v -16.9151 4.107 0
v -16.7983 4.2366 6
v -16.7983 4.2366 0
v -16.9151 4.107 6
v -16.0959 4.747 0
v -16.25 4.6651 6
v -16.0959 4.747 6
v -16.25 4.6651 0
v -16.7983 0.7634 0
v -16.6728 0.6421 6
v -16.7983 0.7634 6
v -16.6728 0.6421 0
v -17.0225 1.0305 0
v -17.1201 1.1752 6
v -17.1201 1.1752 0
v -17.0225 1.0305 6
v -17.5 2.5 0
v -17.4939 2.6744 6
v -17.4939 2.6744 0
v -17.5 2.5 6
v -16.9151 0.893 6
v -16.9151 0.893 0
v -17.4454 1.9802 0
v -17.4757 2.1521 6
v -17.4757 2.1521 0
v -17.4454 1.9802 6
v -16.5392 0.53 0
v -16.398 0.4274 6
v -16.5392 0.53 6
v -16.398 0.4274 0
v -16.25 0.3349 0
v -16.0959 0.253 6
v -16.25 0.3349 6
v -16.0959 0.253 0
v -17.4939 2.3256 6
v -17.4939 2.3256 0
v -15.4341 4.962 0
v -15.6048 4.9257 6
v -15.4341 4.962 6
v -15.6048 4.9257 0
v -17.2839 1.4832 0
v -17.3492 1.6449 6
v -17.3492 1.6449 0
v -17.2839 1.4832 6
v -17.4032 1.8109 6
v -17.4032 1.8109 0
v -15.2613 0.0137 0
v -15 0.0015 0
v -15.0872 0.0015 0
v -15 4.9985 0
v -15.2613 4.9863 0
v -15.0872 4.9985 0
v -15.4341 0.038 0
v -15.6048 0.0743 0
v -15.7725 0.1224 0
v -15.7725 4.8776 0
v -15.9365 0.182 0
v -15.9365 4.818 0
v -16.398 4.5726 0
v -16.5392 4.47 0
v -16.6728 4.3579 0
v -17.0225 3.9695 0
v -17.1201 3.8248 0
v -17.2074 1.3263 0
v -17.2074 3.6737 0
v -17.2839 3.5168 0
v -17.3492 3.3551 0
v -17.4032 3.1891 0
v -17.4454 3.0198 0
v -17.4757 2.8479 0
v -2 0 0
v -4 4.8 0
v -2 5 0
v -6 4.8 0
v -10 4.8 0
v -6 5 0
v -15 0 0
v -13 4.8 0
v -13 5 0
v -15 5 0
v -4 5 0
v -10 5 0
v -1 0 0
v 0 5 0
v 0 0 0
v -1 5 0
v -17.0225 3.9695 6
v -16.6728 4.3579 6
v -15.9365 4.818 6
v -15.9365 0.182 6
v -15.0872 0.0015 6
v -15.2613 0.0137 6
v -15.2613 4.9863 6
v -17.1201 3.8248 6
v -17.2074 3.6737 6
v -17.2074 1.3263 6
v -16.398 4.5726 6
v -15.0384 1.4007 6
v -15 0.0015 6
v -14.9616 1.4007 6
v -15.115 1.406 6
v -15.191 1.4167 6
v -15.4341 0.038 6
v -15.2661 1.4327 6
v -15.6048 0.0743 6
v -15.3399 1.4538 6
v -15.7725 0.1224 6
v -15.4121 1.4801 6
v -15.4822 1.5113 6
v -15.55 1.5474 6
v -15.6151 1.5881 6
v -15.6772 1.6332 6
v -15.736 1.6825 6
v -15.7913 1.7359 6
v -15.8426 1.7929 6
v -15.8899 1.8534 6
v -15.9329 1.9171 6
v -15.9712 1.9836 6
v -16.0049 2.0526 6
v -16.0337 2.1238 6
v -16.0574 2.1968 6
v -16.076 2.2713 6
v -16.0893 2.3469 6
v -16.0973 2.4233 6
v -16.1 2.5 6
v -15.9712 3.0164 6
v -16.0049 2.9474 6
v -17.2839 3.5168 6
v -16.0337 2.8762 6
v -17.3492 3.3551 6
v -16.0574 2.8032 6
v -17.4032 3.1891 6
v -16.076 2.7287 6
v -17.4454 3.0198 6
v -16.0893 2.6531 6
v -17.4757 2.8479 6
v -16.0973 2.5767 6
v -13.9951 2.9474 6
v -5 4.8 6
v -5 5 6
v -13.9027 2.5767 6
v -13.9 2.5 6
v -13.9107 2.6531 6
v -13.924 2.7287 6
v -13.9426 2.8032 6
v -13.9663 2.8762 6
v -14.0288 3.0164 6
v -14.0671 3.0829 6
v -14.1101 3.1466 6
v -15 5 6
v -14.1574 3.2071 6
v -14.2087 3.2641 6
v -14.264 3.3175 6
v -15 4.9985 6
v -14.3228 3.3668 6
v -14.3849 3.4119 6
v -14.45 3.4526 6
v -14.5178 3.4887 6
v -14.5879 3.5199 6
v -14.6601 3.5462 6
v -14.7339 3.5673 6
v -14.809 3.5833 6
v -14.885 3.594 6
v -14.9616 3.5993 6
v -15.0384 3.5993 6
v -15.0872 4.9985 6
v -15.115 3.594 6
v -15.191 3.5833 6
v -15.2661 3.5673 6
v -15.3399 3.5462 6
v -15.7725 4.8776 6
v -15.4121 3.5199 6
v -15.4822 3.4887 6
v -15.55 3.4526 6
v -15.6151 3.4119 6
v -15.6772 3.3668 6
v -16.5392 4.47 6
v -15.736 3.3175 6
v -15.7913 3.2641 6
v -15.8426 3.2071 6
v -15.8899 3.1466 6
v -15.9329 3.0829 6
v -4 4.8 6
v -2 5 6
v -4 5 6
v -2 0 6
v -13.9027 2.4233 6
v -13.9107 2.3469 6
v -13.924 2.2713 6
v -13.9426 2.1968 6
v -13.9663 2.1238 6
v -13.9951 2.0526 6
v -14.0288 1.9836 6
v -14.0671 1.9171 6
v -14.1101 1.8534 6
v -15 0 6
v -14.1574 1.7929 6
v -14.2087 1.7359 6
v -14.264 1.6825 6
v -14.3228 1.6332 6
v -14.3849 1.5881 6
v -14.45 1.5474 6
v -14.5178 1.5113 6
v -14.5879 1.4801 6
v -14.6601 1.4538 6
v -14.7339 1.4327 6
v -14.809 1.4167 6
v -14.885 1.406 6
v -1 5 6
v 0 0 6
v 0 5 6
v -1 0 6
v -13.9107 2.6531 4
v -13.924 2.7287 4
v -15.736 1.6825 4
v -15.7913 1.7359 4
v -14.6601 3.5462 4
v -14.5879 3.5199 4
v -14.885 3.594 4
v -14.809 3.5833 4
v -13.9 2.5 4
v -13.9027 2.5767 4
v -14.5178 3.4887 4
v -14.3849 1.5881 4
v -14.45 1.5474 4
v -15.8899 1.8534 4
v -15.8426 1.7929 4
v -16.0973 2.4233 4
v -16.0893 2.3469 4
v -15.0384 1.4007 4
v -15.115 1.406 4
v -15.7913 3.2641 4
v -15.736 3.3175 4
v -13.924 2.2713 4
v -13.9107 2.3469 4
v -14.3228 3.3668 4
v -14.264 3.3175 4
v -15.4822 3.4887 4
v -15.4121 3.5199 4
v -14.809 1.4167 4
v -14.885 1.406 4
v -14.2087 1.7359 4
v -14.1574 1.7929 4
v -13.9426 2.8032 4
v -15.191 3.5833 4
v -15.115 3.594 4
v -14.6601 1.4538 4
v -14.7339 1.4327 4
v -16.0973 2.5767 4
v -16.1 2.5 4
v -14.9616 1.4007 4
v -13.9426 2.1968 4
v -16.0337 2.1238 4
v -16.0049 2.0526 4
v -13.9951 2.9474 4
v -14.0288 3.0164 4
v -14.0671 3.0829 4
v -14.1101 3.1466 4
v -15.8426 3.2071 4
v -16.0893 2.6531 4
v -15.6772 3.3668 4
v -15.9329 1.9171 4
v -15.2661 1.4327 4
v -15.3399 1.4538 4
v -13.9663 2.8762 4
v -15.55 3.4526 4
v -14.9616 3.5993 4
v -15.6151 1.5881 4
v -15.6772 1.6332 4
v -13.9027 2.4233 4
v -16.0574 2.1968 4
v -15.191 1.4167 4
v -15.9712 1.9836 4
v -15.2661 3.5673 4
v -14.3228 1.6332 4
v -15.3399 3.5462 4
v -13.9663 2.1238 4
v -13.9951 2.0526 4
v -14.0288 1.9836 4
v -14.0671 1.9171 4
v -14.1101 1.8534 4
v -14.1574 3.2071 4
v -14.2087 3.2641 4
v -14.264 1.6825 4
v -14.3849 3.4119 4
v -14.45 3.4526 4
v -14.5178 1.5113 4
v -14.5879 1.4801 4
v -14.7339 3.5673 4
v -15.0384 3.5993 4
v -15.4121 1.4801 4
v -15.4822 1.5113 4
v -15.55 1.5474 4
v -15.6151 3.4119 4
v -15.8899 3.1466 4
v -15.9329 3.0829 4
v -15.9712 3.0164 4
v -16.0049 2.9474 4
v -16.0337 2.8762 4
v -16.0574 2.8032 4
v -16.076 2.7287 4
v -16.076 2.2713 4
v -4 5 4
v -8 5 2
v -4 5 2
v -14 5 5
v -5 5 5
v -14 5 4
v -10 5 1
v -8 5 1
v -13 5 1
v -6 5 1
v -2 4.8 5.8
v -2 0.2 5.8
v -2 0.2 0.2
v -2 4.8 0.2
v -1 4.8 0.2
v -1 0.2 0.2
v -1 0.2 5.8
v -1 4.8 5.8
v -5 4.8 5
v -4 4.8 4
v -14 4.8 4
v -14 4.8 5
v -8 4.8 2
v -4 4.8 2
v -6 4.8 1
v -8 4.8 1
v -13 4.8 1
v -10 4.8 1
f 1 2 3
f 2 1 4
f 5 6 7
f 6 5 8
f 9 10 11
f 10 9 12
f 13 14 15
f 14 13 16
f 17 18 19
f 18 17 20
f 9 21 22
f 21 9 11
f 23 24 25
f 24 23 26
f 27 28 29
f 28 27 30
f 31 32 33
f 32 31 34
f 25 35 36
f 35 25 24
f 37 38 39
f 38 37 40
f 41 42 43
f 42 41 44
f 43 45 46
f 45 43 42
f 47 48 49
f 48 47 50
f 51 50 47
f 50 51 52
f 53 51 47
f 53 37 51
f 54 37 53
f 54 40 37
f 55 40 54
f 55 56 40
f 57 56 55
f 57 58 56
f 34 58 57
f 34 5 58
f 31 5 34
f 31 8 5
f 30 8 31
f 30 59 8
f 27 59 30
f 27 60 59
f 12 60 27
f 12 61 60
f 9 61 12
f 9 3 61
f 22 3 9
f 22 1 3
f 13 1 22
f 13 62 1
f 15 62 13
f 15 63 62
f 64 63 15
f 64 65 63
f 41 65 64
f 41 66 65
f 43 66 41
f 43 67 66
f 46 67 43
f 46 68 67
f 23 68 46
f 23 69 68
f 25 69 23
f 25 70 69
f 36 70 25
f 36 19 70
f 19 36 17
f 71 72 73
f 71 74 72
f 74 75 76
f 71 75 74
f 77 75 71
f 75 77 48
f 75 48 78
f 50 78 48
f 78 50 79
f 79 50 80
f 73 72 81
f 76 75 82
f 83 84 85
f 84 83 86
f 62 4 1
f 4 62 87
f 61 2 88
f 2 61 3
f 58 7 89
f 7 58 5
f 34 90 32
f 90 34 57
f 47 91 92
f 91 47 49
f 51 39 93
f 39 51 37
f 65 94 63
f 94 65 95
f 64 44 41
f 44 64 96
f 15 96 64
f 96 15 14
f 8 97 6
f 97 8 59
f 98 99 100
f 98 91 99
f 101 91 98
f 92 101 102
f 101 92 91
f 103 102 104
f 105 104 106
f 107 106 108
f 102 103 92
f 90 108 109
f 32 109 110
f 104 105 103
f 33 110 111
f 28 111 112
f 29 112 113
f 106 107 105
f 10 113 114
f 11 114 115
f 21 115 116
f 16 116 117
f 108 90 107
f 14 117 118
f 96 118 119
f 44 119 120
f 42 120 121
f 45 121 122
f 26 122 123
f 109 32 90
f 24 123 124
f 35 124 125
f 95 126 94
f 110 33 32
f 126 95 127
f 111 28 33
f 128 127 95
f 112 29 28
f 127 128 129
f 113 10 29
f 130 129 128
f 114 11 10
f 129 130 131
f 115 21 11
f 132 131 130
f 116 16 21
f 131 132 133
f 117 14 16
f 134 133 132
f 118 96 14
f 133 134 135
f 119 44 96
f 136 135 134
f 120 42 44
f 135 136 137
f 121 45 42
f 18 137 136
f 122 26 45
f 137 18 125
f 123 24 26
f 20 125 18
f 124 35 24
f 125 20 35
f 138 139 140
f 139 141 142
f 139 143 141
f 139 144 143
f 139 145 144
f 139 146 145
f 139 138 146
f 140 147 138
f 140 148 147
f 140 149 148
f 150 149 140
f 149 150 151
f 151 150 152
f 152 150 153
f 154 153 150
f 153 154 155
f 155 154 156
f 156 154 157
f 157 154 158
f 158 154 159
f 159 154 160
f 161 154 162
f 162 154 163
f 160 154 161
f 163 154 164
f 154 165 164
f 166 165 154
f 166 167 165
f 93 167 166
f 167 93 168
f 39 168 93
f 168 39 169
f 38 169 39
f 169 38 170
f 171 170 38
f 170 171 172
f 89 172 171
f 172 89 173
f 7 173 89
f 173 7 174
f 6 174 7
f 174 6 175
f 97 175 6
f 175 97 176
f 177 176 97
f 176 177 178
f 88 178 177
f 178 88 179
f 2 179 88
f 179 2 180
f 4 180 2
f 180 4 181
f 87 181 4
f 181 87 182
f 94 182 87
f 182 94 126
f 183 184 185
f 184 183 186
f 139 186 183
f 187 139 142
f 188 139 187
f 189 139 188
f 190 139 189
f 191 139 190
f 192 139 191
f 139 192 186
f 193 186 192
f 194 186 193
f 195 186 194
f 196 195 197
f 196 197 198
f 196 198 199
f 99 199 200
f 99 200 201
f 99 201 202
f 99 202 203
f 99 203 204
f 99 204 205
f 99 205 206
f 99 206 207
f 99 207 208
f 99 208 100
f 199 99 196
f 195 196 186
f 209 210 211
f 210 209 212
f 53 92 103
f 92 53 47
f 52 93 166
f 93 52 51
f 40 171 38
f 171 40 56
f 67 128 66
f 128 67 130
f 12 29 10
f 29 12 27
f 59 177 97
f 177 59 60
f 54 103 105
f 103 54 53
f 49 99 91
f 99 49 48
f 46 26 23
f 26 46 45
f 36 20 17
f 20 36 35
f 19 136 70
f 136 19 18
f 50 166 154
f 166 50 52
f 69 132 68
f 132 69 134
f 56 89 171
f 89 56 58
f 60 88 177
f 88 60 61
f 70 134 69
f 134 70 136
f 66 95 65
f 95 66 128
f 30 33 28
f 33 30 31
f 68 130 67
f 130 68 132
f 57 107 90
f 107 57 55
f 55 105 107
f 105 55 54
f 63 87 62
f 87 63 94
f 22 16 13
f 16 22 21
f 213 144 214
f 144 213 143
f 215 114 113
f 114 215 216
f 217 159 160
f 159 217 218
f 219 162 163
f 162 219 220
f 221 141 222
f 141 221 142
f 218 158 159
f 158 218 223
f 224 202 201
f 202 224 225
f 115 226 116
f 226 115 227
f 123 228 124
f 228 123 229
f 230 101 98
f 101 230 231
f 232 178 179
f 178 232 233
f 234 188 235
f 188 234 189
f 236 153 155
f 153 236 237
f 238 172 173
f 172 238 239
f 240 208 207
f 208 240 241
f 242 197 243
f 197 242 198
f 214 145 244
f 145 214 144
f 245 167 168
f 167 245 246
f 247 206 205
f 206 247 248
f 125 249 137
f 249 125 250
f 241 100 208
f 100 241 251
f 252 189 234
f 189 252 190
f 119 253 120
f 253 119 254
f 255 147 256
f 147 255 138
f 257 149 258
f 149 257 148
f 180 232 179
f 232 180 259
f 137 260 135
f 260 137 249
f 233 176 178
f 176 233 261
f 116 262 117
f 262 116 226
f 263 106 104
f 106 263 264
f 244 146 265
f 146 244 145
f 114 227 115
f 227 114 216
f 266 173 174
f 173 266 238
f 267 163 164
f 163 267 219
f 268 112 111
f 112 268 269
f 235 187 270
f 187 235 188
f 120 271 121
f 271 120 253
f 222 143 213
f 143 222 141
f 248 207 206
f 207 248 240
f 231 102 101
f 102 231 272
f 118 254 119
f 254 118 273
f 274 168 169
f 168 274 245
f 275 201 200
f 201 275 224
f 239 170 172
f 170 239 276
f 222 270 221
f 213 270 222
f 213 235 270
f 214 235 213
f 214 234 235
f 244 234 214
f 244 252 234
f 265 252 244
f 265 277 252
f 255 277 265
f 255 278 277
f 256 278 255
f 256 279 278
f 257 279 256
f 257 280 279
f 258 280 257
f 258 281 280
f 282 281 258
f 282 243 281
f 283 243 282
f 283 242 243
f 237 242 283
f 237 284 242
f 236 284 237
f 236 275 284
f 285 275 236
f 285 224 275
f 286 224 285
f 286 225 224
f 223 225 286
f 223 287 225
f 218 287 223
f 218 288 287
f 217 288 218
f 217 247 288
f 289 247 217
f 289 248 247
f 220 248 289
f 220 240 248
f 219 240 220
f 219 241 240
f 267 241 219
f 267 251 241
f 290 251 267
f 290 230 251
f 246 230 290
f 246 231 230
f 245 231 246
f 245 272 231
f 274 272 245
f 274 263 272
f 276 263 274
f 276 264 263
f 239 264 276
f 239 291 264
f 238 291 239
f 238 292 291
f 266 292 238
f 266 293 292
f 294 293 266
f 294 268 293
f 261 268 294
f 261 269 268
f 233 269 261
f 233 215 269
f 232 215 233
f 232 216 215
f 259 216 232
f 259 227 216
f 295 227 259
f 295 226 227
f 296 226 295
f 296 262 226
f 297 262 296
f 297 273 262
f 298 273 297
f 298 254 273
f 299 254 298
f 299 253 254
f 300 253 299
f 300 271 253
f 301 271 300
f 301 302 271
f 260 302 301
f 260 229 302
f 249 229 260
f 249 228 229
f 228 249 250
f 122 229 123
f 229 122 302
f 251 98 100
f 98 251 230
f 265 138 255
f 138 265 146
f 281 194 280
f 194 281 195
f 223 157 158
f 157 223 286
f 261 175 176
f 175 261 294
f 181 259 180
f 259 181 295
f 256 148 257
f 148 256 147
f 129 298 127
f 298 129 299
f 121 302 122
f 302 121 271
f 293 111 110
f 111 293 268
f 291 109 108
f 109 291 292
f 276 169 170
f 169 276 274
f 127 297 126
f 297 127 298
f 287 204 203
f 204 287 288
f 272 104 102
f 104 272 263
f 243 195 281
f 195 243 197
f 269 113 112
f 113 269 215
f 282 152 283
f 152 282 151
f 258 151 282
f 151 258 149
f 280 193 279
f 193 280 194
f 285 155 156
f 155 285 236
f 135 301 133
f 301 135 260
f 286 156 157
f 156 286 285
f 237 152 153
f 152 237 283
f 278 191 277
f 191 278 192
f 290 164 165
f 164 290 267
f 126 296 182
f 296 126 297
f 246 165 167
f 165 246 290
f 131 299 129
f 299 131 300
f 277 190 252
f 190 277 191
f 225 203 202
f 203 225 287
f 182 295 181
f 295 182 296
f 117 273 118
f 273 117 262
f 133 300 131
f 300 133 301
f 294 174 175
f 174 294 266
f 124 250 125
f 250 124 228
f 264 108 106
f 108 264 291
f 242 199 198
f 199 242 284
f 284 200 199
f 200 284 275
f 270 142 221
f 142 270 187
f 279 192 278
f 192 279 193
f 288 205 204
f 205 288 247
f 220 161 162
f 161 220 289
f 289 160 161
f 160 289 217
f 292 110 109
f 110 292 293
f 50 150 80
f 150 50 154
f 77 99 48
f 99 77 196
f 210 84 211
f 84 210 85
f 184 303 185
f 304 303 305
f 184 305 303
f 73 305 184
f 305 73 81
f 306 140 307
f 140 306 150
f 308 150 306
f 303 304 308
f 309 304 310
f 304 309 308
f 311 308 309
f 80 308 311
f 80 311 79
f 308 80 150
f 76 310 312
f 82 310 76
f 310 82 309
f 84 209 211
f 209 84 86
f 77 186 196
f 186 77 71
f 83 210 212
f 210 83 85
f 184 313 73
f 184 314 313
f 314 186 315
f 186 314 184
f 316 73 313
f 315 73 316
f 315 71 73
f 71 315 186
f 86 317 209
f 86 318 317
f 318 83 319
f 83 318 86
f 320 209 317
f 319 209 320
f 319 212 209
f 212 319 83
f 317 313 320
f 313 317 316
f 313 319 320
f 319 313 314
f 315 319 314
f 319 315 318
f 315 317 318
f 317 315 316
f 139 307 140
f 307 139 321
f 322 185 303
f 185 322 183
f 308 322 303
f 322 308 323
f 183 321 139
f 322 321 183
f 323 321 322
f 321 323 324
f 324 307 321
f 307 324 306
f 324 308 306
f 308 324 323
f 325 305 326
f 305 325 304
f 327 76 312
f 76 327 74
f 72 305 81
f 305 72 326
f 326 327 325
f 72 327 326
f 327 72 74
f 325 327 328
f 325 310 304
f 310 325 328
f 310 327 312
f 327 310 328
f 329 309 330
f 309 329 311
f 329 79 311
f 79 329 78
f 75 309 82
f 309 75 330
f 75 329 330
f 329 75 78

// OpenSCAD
//right leg

$fn=90;

rotate([0,-90,0]){

difference(){

rotate([0,90,0]){
translate([-15,2.5,0]){
color("darkgrey"){
cylinder(r=2.5,h=6);
}
}
}

translate([4,2.5,15]){
rotate([0,90,0]){
cylinder(r=1.1,h=3);
}
}

}

difference(){

color("darkgrey"){
cube([6,5,15]);
}

translate([4,2.5,15]){
rotate([0,90,0]){
cylinder(r=1.1,h=3);
}
}

translate([0,4.8,1]){
color("tan"){
cube([6,1,1]);
}
}

translate([5.8,0,1]){
color("tan"){
cube([1,5,1]);
}
}

translate([0,-0.8,1]){
color("tan"){
cube([6,1,1]);
}
}

translate([-0.8,0,1]){
color("tan"){
cube([1,5,1]);
}
}

translate([4,4.8,4]){
color("tan"){
cube([2,1,1]);
}
}

translate([4,4.8,4]){
color("tan"){
cube([1,1,10]);
}
}

translate([0,4.8,4]){
color("tan"){
cube([2,1,2]);
}
}

translate([1,4.8,6]){
color("tan"){
cube([1,1,2]);
}
}

translate([0,4.8,10]){
color("tan"){
cube([1,1,3]);
}
}

}//end of diff

}
